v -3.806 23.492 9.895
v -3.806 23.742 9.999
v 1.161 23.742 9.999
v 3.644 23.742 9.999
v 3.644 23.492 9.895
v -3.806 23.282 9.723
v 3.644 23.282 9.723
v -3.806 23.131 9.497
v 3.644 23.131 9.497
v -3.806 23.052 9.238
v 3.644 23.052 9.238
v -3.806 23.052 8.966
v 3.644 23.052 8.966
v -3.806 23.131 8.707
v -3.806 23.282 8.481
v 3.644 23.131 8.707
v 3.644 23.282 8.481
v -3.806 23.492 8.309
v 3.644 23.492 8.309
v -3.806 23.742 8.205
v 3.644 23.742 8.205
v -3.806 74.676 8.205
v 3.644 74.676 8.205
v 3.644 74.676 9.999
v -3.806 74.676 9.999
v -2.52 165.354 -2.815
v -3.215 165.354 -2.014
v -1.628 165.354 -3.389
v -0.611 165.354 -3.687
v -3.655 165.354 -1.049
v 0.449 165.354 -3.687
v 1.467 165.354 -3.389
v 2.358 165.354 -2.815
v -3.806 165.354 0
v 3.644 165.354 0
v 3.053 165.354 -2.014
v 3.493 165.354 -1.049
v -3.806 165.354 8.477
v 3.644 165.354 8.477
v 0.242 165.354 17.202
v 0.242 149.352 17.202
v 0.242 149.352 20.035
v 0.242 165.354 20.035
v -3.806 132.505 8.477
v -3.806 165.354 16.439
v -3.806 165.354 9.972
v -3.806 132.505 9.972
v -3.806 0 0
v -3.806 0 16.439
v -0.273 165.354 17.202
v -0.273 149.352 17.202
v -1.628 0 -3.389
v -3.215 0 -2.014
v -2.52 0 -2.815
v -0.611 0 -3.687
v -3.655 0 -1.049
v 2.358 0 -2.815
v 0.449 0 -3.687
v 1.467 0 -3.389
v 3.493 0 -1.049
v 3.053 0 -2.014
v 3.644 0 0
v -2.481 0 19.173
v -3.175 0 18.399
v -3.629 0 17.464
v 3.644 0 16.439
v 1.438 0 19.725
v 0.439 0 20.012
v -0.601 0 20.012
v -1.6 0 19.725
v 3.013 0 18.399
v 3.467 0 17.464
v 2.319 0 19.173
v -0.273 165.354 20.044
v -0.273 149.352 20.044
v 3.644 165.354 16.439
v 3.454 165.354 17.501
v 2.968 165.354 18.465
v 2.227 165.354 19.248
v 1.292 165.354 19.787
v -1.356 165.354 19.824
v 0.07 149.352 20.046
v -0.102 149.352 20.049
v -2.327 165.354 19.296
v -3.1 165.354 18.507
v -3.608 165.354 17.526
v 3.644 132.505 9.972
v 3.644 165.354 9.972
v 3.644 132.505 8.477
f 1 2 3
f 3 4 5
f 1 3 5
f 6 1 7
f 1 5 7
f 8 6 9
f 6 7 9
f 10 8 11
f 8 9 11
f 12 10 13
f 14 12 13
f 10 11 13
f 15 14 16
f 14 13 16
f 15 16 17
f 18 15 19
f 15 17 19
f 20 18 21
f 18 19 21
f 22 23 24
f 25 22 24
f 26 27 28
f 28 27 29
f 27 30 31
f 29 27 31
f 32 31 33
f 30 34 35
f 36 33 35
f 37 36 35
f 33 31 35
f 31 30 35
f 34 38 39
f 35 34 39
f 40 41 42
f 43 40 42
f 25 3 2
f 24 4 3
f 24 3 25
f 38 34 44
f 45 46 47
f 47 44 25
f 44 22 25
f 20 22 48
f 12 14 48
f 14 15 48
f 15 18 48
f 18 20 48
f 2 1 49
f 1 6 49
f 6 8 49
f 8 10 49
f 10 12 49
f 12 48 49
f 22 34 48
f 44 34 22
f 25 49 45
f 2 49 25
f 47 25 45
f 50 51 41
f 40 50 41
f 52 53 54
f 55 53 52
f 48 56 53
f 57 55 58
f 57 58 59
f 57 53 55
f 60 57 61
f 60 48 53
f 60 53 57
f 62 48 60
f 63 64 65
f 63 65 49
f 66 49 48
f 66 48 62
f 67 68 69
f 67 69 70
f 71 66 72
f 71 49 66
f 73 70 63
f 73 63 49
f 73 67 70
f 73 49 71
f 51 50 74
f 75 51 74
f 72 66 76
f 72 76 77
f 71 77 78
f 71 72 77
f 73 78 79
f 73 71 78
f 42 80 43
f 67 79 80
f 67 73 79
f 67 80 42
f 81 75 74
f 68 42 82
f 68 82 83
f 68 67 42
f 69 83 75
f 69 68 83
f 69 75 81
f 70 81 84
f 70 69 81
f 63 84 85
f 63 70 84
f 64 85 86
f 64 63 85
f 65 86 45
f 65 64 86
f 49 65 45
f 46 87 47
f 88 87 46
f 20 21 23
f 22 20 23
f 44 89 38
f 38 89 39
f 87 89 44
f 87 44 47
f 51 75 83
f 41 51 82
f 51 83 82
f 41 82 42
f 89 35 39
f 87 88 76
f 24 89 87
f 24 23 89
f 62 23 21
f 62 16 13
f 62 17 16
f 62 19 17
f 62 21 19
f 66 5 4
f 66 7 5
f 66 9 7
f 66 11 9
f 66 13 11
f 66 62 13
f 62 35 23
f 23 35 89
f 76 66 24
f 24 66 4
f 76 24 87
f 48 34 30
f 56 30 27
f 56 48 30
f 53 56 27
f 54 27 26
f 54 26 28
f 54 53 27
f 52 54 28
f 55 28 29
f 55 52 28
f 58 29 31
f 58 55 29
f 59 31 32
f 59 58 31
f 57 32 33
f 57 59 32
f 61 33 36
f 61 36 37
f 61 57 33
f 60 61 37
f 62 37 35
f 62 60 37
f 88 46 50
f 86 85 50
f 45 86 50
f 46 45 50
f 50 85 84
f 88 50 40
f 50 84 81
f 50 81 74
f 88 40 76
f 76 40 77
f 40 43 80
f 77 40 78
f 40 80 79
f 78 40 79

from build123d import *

# Parameters (mm, degrees)
F0_W     = 7.450324
F0_H     = 16.439302
F1_DEPTH = 165.354
F3_W     = 50.933755
F3_H     = 1.793447
F4_DEPTH = 232.41
F6_W     = 0.515365
F6_H     = 3.407134
F7_DEPTH = 43.6118
F8_W     = 37.184134
F8_H     = 1.494539
F9_DEPTH = 232.41


with BuildPart() as f1:
    # F0 (on Front) → F1 (new body)
    with BuildSketch(Plane.XZ):
        with BuildLine():
            Line((-3.806144, 16.439302), (3.64418, 16.439302))
            ThreePointArc((3.64418, 16.439302), (-0.080982, 20.048889), (-3.806144, 16.439302))
        make_face()
        with Locations((-0.080982, 8.219651)):
            Rectangle(F0_W, F0_H)
        with BuildLine():
            ThreePointArc((-3.806144, 0), (-0.080982, -3.725162), (3.64418, 0))
            Line((3.64418, 0), (-3.806144, 0))
        make_face()
    extrude(amount=-F1_DEPTH)

    # F3 (on offset) → F4 (cut)
    with BuildSketch(Plane.YZ.offset(139.7)):
        with BuildLine():
            Line((23.742341, 8.20523), (23.742341, 9.998677))
            ThreePointArc((23.742341, 9.998677), (23.042202, 9.101954), (23.742341, 8.20523))
        make_face()
        with Locations((49.209218, 9.101954)):
            Rectangle(F3_W, F3_H)
    extrude(amount=-F4_DEPTH, mode=Mode.SUBTRACT)

    # F6 (on offset) → F7 (cut)
    with BuildSketch(Plane.XZ.offset(-149.352)):
        with Locations((-0.015719, 18.905162)):
            Rectangle(F6_W, F6_H)
    extrude(amount=-F7_DEPTH, mode=Mode.SUBTRACT)

    # F8 (on offset) → F9 (cut)
    with BuildSketch(Plane.YZ.offset(139.7)):
        with Locations((151.09729, 9.224657)):
            Rectangle(F8_W, F8_H)
    extrude(amount=-F9_DEPTH, mode=Mode.SUBTRACT)


solid = f1.part
